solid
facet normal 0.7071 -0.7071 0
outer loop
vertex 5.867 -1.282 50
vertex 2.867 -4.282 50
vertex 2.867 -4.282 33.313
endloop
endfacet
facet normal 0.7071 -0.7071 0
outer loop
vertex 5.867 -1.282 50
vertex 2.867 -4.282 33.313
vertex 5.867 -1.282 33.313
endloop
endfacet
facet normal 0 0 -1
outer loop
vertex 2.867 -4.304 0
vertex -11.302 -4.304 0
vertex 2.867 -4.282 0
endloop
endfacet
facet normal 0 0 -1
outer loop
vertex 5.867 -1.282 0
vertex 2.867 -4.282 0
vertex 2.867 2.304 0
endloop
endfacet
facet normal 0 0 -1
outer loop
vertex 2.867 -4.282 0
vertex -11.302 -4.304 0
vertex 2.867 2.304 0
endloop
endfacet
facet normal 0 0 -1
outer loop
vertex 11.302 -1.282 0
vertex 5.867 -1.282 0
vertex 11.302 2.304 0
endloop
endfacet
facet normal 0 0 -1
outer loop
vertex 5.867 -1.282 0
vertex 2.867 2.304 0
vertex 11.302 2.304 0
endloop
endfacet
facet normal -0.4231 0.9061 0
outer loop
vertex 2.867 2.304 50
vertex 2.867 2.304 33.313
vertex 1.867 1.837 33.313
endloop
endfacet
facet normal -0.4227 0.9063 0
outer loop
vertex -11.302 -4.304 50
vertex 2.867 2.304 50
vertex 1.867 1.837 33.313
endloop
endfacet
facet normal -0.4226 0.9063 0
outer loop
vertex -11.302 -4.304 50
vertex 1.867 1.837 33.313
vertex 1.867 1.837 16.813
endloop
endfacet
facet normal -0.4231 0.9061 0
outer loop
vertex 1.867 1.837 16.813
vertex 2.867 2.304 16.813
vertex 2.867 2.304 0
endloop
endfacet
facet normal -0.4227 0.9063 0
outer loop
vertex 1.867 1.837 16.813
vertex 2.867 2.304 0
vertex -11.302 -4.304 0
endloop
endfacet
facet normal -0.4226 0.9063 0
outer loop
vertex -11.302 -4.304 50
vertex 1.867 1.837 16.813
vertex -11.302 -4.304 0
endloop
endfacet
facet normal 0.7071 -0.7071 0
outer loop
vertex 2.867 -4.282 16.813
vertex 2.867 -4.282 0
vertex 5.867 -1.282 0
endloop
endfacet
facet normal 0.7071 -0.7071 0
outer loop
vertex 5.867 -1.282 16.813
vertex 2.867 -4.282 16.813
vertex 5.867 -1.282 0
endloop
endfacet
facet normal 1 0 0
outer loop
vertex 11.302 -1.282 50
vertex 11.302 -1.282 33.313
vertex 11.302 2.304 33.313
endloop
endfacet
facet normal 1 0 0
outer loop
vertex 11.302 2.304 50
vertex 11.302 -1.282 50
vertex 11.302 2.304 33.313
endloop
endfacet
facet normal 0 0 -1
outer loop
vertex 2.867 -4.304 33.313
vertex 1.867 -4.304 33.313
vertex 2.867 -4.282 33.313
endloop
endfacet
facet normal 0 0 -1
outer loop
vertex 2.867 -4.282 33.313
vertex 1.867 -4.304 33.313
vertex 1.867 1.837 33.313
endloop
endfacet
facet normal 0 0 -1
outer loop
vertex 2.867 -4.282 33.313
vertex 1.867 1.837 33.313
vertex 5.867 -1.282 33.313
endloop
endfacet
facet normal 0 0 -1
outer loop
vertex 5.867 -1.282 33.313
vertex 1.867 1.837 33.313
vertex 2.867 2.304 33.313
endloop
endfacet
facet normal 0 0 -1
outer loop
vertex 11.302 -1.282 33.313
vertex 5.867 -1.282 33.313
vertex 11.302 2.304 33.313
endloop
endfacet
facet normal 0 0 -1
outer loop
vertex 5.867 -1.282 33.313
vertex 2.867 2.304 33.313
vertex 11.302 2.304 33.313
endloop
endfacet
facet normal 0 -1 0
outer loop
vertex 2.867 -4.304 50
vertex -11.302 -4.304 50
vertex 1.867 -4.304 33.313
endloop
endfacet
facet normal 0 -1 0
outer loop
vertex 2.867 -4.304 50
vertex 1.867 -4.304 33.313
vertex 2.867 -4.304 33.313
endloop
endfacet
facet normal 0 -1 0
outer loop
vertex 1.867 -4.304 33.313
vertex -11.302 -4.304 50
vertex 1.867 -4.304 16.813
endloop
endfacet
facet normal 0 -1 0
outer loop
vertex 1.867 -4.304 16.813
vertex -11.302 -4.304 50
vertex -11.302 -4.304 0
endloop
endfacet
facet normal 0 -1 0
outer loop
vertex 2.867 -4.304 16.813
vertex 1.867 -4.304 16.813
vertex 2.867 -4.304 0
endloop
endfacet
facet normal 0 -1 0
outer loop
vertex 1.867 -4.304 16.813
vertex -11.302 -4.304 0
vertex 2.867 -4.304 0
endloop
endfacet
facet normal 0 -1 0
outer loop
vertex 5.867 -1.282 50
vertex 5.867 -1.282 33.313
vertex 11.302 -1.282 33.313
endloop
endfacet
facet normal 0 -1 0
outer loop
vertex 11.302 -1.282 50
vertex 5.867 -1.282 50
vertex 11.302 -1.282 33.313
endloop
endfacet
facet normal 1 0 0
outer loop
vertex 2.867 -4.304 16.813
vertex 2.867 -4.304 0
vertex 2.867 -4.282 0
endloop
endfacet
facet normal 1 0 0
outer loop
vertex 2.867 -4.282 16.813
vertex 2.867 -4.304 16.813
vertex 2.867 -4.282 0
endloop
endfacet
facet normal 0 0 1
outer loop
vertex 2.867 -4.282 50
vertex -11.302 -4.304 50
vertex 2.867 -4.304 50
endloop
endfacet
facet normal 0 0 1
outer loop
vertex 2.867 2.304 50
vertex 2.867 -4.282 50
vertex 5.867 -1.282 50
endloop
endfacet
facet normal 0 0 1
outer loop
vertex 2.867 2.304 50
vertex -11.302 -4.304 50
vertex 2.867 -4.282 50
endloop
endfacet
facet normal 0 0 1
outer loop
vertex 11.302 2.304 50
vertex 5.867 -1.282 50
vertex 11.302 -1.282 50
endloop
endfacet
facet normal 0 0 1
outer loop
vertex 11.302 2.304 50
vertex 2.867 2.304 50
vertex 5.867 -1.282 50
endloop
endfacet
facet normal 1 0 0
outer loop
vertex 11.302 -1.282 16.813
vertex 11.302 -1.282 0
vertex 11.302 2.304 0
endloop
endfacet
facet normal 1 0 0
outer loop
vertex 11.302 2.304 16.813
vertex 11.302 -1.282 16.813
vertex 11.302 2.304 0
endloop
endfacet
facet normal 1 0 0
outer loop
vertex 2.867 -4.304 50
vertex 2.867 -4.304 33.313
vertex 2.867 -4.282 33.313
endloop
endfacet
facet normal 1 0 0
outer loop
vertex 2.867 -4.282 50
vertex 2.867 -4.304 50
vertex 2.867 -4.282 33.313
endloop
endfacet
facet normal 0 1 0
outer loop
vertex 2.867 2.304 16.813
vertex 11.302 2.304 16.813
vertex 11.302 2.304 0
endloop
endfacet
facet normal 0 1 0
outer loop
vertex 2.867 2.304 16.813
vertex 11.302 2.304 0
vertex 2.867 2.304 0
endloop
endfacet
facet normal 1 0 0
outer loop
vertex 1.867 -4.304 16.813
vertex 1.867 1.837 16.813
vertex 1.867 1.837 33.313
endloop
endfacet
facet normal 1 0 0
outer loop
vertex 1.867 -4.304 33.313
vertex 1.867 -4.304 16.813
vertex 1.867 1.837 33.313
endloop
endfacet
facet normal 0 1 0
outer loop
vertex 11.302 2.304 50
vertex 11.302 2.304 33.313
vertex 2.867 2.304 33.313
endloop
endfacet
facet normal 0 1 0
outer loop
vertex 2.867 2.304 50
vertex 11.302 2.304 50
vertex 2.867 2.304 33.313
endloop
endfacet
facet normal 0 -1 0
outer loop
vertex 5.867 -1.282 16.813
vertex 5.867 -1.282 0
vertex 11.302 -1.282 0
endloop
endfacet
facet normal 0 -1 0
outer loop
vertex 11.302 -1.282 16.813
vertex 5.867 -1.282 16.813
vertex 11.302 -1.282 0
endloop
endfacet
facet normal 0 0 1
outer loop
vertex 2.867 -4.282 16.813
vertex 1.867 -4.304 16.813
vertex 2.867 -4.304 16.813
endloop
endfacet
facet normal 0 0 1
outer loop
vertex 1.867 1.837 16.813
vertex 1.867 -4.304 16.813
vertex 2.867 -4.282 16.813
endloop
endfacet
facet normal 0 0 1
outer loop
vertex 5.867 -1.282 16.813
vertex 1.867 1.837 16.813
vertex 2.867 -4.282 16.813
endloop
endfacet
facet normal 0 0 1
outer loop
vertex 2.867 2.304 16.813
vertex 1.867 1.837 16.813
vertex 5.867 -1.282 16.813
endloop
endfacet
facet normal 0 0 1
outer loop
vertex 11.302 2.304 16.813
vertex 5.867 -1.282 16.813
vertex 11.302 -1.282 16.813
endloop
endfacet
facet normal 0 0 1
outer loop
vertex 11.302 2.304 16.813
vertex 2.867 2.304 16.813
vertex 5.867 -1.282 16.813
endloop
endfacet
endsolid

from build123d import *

# Parameters (mm, degrees)
EXTRUDE_1_DEPTH          = 50
CUT_EXTRUDE_1_DEPTH      = 10
CUT_EXTRUDE_1_DEPTH_BACK = 10
SKETCH_2_W               = 9.435028842
SKETCH_2_H               = 16.5


with BuildPart() as part:
    # Эскиз1 → Бобышка-Вытянуть1 (new body)
    with BuildSketch(Plane.XY):
        Polygon((2.867002202, -4.303564356), (2.867002202, -4.282485579), (5.867002202, -1.282485579), (11.302031044, -1.282485579), (11.302031044, 2.303564356), (2.867002202, 2.303564356), (-11.302031044, -4.303564356), align=None)
    extrude(amount=EXTRUDE_1_DEPTH)

    # Эскиз2 → Вырез-Вытянуть1 (cut, two sides: drawn at the far end of the back side and taken through both)
    with BuildSketch(Plane.XZ.offset(1.282485579).offset(-CUT_EXTRUDE_1_DEPTH_BACK)):
        with Locations((6.584516623, 25.063055317)):
            Rectangle(SKETCH_2_W, SKETCH_2_H)
    extrude(amount=CUT_EXTRUDE_1_DEPTH + CUT_EXTRUDE_1_DEPTH_BACK, mode=Mode.SUBTRACT)


solid = part.part
